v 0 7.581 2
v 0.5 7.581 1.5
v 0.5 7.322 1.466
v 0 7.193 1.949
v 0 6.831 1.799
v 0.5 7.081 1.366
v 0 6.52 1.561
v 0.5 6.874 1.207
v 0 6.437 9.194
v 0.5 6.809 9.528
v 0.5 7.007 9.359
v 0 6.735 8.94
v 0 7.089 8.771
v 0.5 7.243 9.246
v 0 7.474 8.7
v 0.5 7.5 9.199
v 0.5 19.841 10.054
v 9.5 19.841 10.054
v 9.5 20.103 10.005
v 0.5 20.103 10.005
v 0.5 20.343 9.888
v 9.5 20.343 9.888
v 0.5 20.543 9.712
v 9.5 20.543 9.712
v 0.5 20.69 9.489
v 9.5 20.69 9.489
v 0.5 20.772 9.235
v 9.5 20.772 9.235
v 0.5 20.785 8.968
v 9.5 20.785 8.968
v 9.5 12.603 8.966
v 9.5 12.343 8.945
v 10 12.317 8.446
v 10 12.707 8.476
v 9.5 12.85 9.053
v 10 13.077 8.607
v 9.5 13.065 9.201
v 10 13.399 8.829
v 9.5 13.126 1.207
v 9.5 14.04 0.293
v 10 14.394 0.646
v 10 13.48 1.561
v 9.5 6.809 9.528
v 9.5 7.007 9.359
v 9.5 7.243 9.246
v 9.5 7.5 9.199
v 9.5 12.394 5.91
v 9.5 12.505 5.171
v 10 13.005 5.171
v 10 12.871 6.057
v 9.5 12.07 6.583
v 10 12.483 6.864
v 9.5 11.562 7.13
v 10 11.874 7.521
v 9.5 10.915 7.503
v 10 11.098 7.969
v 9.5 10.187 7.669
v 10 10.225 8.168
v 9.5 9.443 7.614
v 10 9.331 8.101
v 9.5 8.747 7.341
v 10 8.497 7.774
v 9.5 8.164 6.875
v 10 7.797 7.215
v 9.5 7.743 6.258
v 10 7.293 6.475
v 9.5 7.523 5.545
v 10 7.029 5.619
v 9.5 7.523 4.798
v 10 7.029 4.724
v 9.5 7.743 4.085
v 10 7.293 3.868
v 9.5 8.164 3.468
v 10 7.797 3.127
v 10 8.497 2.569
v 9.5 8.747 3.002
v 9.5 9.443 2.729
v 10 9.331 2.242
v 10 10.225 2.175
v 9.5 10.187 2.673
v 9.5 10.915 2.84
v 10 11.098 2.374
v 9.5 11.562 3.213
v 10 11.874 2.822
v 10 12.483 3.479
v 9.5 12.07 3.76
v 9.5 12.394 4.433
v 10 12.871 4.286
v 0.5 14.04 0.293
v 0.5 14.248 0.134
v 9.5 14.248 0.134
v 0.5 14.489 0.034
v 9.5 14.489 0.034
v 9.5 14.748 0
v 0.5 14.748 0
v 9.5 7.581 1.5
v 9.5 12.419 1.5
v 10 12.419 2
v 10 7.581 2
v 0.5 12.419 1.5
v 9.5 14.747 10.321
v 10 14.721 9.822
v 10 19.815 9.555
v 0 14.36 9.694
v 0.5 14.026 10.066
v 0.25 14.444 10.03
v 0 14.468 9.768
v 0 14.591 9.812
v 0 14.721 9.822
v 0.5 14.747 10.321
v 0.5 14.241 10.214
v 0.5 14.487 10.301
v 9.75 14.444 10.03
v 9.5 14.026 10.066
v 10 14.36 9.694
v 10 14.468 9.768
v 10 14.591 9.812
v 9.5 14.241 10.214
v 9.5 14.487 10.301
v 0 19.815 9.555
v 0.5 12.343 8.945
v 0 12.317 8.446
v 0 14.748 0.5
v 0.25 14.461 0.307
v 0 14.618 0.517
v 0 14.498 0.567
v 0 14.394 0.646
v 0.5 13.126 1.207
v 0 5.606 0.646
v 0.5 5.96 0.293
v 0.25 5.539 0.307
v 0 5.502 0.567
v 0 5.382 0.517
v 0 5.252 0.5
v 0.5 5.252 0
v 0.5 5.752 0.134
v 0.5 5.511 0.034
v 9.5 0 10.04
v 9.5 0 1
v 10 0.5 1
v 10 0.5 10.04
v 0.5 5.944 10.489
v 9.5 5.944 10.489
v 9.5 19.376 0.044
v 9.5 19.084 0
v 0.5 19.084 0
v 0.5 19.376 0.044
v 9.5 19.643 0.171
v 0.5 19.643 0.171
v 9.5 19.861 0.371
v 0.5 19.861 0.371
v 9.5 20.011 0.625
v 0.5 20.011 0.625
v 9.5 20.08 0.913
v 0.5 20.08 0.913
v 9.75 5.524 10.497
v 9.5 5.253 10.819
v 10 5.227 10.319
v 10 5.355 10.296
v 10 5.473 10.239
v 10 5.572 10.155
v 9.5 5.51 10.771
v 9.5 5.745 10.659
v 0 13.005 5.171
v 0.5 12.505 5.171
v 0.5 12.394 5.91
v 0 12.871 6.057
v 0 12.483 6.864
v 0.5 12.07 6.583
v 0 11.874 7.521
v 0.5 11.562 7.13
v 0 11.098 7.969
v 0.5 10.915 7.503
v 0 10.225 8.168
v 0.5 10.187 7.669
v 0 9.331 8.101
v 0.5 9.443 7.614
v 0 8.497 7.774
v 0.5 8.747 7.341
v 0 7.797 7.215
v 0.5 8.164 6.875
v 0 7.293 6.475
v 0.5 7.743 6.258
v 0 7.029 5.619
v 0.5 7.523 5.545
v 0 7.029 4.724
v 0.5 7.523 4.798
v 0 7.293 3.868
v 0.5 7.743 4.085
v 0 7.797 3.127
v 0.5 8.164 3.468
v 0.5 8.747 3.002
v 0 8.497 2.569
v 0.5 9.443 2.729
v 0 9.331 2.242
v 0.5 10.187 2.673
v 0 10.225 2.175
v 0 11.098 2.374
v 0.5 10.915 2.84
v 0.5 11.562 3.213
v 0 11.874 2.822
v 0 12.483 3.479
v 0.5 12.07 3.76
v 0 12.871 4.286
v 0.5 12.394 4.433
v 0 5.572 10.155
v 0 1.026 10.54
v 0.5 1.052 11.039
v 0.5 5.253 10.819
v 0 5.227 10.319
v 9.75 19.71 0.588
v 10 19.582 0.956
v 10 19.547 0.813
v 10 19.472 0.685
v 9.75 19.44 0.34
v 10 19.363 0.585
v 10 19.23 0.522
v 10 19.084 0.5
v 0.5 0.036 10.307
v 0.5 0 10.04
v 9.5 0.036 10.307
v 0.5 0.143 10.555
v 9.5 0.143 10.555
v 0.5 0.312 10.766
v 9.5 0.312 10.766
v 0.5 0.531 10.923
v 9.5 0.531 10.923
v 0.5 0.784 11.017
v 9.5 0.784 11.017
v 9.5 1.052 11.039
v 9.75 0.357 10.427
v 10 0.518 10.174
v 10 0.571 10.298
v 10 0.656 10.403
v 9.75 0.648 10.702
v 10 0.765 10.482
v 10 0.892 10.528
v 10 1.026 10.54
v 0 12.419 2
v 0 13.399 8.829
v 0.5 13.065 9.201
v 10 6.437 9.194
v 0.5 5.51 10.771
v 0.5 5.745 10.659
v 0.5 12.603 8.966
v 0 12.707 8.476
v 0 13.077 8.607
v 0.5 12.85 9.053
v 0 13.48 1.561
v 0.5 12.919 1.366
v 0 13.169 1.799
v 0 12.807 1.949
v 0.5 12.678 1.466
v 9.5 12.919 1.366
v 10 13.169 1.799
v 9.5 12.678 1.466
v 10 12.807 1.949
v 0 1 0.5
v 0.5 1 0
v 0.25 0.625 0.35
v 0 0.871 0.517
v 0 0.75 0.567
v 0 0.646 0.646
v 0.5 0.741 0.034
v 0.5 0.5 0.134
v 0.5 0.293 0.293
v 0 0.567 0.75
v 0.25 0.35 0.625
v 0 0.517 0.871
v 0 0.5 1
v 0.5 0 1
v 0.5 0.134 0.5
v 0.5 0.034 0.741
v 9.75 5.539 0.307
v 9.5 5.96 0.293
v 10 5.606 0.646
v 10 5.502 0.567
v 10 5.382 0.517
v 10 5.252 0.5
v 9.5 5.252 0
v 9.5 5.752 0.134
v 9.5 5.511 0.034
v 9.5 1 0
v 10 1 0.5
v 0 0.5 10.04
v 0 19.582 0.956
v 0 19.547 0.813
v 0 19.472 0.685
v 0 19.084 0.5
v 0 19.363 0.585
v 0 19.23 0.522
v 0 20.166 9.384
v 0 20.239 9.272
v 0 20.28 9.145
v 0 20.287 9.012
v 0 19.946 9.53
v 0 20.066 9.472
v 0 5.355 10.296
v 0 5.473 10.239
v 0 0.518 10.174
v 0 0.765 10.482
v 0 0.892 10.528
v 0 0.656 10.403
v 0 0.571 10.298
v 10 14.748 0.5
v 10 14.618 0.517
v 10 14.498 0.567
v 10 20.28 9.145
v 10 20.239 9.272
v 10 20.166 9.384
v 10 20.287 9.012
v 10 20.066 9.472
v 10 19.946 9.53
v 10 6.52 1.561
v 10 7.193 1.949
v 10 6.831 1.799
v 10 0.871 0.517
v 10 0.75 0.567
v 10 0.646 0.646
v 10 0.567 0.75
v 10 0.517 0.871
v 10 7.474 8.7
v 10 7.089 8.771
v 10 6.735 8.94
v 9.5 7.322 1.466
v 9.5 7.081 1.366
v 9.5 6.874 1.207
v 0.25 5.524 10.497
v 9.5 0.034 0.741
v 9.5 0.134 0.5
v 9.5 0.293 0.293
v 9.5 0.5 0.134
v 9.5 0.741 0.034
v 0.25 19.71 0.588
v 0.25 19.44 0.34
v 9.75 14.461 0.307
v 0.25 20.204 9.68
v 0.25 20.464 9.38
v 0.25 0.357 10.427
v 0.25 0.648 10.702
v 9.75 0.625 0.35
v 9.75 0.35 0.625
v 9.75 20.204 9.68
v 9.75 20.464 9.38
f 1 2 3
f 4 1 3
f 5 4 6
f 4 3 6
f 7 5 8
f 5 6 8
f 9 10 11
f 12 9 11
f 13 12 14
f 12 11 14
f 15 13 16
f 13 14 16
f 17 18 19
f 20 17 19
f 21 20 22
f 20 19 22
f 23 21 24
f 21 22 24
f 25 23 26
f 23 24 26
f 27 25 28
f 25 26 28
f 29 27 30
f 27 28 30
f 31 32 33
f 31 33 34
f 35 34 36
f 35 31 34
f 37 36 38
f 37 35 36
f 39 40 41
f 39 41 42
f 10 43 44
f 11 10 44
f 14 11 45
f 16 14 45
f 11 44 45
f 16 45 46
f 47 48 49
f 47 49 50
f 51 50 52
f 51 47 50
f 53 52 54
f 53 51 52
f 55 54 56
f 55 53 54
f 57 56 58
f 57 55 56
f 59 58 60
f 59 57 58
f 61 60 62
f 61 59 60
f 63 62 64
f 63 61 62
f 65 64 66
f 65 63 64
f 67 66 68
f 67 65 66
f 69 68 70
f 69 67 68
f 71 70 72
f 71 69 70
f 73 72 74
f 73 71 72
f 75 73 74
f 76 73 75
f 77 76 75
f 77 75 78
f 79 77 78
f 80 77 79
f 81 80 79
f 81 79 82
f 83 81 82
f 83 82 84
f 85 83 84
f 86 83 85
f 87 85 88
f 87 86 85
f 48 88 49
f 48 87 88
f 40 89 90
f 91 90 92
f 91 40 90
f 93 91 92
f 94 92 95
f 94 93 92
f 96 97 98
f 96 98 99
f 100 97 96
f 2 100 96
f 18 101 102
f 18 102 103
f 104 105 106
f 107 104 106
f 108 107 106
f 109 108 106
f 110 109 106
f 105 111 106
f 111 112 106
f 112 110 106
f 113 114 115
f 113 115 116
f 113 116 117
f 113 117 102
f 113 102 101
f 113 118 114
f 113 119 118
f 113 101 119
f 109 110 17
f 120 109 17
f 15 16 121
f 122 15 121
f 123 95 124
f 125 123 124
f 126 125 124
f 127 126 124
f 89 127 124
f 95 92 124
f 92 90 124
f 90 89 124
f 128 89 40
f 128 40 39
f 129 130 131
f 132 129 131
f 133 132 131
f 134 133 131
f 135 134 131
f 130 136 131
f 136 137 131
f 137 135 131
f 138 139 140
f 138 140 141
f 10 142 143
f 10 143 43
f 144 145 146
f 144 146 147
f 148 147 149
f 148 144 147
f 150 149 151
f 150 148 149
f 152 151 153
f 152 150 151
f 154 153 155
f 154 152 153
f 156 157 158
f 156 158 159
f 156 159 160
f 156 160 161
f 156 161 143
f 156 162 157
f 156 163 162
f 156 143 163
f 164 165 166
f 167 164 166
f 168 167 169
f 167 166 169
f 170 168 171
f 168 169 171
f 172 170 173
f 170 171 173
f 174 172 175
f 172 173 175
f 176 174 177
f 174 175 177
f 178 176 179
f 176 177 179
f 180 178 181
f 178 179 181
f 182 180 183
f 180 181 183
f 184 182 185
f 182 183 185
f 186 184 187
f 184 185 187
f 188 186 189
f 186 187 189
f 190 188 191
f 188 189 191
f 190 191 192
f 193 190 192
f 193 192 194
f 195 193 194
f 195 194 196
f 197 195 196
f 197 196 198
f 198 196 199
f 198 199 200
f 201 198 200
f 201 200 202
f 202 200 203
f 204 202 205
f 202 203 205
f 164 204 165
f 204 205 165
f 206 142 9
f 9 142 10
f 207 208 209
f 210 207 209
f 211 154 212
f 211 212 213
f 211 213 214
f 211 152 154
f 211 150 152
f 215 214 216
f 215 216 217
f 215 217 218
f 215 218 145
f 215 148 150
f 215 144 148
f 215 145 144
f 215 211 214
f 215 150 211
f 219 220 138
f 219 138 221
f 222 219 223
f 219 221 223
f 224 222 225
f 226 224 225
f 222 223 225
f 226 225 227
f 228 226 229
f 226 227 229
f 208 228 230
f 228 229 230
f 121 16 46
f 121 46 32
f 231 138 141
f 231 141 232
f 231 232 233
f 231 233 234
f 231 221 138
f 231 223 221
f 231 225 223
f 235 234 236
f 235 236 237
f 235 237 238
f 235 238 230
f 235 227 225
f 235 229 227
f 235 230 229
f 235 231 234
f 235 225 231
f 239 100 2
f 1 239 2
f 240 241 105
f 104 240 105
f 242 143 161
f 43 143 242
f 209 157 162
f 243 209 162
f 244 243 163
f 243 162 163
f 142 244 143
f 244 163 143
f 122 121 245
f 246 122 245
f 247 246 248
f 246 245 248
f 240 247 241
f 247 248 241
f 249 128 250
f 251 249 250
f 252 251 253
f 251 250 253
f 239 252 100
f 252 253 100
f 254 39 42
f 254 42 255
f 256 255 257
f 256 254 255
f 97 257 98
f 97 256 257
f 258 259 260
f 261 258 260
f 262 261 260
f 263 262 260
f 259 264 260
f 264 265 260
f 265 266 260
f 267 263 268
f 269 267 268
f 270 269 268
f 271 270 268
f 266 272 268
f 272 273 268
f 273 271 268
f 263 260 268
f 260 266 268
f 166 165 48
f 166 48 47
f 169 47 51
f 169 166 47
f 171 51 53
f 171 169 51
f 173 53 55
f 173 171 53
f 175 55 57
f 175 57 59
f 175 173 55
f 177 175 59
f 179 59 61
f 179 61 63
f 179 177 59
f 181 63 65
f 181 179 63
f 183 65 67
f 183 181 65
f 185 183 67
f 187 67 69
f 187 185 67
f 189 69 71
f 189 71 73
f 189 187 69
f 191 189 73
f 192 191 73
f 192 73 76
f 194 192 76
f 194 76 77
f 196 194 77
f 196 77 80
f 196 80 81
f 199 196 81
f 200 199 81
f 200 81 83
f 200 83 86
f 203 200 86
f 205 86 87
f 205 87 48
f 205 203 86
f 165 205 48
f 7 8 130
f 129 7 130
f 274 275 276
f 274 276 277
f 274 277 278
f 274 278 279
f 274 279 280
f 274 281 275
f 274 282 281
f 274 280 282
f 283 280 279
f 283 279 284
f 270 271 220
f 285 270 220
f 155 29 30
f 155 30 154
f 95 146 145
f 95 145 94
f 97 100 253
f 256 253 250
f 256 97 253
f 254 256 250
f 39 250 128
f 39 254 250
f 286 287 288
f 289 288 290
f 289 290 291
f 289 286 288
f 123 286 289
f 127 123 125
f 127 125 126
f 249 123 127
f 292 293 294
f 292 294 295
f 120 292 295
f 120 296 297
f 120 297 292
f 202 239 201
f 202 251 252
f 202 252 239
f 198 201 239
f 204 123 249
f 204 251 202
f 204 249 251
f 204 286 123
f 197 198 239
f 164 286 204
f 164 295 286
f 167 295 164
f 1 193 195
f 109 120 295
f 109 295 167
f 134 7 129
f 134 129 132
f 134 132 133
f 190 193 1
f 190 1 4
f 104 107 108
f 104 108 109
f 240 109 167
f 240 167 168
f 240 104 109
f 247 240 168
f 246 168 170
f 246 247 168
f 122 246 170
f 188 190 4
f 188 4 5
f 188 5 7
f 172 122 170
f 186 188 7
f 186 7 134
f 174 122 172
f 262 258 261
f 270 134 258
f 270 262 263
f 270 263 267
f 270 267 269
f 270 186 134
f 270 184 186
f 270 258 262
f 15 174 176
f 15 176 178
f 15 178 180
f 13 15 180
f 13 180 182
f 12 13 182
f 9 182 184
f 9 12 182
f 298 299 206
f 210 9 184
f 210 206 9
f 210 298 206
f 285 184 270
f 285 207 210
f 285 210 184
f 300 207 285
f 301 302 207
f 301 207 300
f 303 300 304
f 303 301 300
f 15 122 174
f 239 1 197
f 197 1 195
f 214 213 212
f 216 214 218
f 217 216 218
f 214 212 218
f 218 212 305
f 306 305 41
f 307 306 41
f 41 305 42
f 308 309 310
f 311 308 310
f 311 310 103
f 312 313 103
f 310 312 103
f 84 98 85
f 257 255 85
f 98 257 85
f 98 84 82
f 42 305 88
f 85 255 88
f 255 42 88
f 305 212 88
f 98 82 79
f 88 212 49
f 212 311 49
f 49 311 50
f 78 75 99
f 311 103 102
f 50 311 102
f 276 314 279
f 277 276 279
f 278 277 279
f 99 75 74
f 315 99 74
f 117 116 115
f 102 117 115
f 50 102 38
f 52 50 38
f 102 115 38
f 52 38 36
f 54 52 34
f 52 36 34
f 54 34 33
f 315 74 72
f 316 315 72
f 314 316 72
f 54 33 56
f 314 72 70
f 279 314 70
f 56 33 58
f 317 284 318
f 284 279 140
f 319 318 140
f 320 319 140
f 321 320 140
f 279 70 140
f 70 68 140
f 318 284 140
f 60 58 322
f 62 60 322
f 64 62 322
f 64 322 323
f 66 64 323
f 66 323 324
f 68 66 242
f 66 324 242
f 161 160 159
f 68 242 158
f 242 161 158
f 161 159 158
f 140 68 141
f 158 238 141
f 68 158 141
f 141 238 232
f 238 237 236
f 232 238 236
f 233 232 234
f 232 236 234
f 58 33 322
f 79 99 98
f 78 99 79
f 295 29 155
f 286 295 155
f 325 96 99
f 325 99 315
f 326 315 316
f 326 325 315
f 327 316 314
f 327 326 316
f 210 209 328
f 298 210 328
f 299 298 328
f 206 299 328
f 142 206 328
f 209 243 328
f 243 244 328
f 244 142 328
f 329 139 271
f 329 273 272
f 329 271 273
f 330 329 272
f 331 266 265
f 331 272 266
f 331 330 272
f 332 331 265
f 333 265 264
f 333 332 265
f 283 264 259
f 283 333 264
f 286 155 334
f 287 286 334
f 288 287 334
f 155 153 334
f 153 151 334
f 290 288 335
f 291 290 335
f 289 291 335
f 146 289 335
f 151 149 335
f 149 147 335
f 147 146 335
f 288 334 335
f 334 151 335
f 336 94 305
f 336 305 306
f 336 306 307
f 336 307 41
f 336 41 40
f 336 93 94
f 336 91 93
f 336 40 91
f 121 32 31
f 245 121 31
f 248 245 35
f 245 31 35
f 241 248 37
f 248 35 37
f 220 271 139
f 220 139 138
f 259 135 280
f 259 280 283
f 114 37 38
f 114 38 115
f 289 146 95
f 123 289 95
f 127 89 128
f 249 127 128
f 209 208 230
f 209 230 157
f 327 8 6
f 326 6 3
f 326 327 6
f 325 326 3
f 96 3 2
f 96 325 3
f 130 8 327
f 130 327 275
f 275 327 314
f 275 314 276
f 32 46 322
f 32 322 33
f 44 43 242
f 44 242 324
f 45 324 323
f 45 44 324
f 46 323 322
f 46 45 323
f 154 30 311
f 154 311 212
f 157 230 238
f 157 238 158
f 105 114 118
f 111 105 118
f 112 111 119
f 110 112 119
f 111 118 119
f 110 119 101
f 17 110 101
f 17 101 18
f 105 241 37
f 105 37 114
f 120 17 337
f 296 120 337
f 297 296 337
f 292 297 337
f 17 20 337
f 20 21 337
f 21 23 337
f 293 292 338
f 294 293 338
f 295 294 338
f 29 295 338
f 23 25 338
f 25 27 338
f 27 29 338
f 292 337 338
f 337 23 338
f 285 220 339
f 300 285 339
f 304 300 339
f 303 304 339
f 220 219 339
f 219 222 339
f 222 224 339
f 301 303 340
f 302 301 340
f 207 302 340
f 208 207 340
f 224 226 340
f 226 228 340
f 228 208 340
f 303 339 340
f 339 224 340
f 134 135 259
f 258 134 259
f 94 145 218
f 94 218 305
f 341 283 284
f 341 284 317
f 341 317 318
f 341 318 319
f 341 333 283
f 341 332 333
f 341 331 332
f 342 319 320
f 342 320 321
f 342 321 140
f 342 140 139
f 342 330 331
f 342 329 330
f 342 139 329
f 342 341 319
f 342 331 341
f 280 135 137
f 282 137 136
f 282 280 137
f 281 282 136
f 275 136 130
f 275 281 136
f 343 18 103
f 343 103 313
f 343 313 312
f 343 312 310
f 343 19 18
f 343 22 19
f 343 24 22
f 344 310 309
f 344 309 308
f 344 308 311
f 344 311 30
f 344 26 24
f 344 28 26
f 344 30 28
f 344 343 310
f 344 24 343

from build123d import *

# Parameters (mm, degrees)
SKETCH_R     = 2.505
PAD_DEPTH    = 10
FILLET_R     = 1
CHAMFER_SIZE = 0.5


with BuildPart() as part:
    # Sketch → Pad (new body)
    with BuildSketch(Plane.YZ):
        Polygon((0, 0), (0, 11.094006), (5.666667, 10.797029), (7.086107, 9.220581), (12.756885, 8.923388), (14.333333, 10.342828), (20.874887, 10), (20, 0), (14.333333, 0), (12.833333, 1.5), (7.166667, 1.5), (5.666667, 0), align=None)
        with Locations((10, 5.171414)):
            Circle(SKETCH_R, mode=Mode.SUBTRACT)
    extrude(amount=PAD_DEPTH)

    # Fillet
    fillet_edges = [part.edges().sort_by_distance(p)[0] for p in [
        (5, 0, 11.094006),
        (5, 5.666667, 10.797029),
        (5, 7.086107, 9.220581),
        (5, 12.756885, 8.923388),
        (5, 14.333333, 10.342828),
        (5, 20.874887, 10),
        (5, 0, 0),
        (5, 5.666667, 0),
        (5, 7.166667, 1.5),
        (5, 12.833333, 1.5),
        (5, 14.333333, 0),
        (5, 20, 0),
    ]]
    fillet(fillet_edges, radius=FILLET_R)

    # Chamfer
    chamfer_edges = [part.edges().sort_by_distance(p)[0] for p in [
        (0, 3.126227, 0),
        (0, 0.292893, 0.292893),
        (0, 5.635137, 0.07612),
        (0, 0, 5.520113),
        (0, 6.416667, 0.75),
        (0, 0.311645, 10.765601),
        (0, 7.198197, 1.42388),
        (0, 3.152678, 10.928782),
        (0, 10, 1.5),
        (0, 5.631196, 10.722663),
        (0, 12.801803, 1.42388),
        (0, 6.376387, 10.008805),
        (0, 13.583333, 0.75),
        (0, 7.121578, 9.294947),
        (0, 14.364863, 0.07612),
        (0, 9.921496, 9.071984),
        (0, 16.915608, 0),
        (0, 12.729382, 9.001054),
        (0, 19.759259, 0.262723),
        (0, 13.545109, 9.633108),
        (0, 20.432249, 4.940627),
        (0, 14.360836, 10.265162),
        (0, 20.543149, 9.711625),
        (0, 17.293877, 10.187673),
        (0, 7.495, 5.171414),
        (10, 3.126227, 0),
        (10, 0.292893, 0.292893),
        (10, 5.635137, 0.07612),
        (10, 0, 5.520113),
        (10, 6.416667, 0.75),
        (10, 0.311645, 10.765601),
        (10, 7.198197, 1.42388),
        (10, 3.152678, 10.928782),
        (10, 10, 1.5),
        (10, 5.631196, 10.722663),
        (10, 12.801803, 1.42388),
        (10, 6.376387, 10.008805),
        (10, 13.583333, 0.75),
        (10, 7.121578, 9.294947),
        (10, 14.364863, 0.07612),
        (10, 9.921496, 9.071984),
        (10, 16.915608, 0),
        (10, 12.729382, 9.001054),
        (10, 19.759259, 0.262723),
        (10, 13.545109, 9.633108),
        (10, 20.432249, 4.940627),
        (10, 14.360836, 10.265162),
        (10, 20.543149, 9.711625),
        (10, 17.293877, 10.187673),
        (10, 7.495, 5.171414),
    ]]
    chamfer(chamfer_edges, length=CHAMFER_SIZE)


solid = part.part
